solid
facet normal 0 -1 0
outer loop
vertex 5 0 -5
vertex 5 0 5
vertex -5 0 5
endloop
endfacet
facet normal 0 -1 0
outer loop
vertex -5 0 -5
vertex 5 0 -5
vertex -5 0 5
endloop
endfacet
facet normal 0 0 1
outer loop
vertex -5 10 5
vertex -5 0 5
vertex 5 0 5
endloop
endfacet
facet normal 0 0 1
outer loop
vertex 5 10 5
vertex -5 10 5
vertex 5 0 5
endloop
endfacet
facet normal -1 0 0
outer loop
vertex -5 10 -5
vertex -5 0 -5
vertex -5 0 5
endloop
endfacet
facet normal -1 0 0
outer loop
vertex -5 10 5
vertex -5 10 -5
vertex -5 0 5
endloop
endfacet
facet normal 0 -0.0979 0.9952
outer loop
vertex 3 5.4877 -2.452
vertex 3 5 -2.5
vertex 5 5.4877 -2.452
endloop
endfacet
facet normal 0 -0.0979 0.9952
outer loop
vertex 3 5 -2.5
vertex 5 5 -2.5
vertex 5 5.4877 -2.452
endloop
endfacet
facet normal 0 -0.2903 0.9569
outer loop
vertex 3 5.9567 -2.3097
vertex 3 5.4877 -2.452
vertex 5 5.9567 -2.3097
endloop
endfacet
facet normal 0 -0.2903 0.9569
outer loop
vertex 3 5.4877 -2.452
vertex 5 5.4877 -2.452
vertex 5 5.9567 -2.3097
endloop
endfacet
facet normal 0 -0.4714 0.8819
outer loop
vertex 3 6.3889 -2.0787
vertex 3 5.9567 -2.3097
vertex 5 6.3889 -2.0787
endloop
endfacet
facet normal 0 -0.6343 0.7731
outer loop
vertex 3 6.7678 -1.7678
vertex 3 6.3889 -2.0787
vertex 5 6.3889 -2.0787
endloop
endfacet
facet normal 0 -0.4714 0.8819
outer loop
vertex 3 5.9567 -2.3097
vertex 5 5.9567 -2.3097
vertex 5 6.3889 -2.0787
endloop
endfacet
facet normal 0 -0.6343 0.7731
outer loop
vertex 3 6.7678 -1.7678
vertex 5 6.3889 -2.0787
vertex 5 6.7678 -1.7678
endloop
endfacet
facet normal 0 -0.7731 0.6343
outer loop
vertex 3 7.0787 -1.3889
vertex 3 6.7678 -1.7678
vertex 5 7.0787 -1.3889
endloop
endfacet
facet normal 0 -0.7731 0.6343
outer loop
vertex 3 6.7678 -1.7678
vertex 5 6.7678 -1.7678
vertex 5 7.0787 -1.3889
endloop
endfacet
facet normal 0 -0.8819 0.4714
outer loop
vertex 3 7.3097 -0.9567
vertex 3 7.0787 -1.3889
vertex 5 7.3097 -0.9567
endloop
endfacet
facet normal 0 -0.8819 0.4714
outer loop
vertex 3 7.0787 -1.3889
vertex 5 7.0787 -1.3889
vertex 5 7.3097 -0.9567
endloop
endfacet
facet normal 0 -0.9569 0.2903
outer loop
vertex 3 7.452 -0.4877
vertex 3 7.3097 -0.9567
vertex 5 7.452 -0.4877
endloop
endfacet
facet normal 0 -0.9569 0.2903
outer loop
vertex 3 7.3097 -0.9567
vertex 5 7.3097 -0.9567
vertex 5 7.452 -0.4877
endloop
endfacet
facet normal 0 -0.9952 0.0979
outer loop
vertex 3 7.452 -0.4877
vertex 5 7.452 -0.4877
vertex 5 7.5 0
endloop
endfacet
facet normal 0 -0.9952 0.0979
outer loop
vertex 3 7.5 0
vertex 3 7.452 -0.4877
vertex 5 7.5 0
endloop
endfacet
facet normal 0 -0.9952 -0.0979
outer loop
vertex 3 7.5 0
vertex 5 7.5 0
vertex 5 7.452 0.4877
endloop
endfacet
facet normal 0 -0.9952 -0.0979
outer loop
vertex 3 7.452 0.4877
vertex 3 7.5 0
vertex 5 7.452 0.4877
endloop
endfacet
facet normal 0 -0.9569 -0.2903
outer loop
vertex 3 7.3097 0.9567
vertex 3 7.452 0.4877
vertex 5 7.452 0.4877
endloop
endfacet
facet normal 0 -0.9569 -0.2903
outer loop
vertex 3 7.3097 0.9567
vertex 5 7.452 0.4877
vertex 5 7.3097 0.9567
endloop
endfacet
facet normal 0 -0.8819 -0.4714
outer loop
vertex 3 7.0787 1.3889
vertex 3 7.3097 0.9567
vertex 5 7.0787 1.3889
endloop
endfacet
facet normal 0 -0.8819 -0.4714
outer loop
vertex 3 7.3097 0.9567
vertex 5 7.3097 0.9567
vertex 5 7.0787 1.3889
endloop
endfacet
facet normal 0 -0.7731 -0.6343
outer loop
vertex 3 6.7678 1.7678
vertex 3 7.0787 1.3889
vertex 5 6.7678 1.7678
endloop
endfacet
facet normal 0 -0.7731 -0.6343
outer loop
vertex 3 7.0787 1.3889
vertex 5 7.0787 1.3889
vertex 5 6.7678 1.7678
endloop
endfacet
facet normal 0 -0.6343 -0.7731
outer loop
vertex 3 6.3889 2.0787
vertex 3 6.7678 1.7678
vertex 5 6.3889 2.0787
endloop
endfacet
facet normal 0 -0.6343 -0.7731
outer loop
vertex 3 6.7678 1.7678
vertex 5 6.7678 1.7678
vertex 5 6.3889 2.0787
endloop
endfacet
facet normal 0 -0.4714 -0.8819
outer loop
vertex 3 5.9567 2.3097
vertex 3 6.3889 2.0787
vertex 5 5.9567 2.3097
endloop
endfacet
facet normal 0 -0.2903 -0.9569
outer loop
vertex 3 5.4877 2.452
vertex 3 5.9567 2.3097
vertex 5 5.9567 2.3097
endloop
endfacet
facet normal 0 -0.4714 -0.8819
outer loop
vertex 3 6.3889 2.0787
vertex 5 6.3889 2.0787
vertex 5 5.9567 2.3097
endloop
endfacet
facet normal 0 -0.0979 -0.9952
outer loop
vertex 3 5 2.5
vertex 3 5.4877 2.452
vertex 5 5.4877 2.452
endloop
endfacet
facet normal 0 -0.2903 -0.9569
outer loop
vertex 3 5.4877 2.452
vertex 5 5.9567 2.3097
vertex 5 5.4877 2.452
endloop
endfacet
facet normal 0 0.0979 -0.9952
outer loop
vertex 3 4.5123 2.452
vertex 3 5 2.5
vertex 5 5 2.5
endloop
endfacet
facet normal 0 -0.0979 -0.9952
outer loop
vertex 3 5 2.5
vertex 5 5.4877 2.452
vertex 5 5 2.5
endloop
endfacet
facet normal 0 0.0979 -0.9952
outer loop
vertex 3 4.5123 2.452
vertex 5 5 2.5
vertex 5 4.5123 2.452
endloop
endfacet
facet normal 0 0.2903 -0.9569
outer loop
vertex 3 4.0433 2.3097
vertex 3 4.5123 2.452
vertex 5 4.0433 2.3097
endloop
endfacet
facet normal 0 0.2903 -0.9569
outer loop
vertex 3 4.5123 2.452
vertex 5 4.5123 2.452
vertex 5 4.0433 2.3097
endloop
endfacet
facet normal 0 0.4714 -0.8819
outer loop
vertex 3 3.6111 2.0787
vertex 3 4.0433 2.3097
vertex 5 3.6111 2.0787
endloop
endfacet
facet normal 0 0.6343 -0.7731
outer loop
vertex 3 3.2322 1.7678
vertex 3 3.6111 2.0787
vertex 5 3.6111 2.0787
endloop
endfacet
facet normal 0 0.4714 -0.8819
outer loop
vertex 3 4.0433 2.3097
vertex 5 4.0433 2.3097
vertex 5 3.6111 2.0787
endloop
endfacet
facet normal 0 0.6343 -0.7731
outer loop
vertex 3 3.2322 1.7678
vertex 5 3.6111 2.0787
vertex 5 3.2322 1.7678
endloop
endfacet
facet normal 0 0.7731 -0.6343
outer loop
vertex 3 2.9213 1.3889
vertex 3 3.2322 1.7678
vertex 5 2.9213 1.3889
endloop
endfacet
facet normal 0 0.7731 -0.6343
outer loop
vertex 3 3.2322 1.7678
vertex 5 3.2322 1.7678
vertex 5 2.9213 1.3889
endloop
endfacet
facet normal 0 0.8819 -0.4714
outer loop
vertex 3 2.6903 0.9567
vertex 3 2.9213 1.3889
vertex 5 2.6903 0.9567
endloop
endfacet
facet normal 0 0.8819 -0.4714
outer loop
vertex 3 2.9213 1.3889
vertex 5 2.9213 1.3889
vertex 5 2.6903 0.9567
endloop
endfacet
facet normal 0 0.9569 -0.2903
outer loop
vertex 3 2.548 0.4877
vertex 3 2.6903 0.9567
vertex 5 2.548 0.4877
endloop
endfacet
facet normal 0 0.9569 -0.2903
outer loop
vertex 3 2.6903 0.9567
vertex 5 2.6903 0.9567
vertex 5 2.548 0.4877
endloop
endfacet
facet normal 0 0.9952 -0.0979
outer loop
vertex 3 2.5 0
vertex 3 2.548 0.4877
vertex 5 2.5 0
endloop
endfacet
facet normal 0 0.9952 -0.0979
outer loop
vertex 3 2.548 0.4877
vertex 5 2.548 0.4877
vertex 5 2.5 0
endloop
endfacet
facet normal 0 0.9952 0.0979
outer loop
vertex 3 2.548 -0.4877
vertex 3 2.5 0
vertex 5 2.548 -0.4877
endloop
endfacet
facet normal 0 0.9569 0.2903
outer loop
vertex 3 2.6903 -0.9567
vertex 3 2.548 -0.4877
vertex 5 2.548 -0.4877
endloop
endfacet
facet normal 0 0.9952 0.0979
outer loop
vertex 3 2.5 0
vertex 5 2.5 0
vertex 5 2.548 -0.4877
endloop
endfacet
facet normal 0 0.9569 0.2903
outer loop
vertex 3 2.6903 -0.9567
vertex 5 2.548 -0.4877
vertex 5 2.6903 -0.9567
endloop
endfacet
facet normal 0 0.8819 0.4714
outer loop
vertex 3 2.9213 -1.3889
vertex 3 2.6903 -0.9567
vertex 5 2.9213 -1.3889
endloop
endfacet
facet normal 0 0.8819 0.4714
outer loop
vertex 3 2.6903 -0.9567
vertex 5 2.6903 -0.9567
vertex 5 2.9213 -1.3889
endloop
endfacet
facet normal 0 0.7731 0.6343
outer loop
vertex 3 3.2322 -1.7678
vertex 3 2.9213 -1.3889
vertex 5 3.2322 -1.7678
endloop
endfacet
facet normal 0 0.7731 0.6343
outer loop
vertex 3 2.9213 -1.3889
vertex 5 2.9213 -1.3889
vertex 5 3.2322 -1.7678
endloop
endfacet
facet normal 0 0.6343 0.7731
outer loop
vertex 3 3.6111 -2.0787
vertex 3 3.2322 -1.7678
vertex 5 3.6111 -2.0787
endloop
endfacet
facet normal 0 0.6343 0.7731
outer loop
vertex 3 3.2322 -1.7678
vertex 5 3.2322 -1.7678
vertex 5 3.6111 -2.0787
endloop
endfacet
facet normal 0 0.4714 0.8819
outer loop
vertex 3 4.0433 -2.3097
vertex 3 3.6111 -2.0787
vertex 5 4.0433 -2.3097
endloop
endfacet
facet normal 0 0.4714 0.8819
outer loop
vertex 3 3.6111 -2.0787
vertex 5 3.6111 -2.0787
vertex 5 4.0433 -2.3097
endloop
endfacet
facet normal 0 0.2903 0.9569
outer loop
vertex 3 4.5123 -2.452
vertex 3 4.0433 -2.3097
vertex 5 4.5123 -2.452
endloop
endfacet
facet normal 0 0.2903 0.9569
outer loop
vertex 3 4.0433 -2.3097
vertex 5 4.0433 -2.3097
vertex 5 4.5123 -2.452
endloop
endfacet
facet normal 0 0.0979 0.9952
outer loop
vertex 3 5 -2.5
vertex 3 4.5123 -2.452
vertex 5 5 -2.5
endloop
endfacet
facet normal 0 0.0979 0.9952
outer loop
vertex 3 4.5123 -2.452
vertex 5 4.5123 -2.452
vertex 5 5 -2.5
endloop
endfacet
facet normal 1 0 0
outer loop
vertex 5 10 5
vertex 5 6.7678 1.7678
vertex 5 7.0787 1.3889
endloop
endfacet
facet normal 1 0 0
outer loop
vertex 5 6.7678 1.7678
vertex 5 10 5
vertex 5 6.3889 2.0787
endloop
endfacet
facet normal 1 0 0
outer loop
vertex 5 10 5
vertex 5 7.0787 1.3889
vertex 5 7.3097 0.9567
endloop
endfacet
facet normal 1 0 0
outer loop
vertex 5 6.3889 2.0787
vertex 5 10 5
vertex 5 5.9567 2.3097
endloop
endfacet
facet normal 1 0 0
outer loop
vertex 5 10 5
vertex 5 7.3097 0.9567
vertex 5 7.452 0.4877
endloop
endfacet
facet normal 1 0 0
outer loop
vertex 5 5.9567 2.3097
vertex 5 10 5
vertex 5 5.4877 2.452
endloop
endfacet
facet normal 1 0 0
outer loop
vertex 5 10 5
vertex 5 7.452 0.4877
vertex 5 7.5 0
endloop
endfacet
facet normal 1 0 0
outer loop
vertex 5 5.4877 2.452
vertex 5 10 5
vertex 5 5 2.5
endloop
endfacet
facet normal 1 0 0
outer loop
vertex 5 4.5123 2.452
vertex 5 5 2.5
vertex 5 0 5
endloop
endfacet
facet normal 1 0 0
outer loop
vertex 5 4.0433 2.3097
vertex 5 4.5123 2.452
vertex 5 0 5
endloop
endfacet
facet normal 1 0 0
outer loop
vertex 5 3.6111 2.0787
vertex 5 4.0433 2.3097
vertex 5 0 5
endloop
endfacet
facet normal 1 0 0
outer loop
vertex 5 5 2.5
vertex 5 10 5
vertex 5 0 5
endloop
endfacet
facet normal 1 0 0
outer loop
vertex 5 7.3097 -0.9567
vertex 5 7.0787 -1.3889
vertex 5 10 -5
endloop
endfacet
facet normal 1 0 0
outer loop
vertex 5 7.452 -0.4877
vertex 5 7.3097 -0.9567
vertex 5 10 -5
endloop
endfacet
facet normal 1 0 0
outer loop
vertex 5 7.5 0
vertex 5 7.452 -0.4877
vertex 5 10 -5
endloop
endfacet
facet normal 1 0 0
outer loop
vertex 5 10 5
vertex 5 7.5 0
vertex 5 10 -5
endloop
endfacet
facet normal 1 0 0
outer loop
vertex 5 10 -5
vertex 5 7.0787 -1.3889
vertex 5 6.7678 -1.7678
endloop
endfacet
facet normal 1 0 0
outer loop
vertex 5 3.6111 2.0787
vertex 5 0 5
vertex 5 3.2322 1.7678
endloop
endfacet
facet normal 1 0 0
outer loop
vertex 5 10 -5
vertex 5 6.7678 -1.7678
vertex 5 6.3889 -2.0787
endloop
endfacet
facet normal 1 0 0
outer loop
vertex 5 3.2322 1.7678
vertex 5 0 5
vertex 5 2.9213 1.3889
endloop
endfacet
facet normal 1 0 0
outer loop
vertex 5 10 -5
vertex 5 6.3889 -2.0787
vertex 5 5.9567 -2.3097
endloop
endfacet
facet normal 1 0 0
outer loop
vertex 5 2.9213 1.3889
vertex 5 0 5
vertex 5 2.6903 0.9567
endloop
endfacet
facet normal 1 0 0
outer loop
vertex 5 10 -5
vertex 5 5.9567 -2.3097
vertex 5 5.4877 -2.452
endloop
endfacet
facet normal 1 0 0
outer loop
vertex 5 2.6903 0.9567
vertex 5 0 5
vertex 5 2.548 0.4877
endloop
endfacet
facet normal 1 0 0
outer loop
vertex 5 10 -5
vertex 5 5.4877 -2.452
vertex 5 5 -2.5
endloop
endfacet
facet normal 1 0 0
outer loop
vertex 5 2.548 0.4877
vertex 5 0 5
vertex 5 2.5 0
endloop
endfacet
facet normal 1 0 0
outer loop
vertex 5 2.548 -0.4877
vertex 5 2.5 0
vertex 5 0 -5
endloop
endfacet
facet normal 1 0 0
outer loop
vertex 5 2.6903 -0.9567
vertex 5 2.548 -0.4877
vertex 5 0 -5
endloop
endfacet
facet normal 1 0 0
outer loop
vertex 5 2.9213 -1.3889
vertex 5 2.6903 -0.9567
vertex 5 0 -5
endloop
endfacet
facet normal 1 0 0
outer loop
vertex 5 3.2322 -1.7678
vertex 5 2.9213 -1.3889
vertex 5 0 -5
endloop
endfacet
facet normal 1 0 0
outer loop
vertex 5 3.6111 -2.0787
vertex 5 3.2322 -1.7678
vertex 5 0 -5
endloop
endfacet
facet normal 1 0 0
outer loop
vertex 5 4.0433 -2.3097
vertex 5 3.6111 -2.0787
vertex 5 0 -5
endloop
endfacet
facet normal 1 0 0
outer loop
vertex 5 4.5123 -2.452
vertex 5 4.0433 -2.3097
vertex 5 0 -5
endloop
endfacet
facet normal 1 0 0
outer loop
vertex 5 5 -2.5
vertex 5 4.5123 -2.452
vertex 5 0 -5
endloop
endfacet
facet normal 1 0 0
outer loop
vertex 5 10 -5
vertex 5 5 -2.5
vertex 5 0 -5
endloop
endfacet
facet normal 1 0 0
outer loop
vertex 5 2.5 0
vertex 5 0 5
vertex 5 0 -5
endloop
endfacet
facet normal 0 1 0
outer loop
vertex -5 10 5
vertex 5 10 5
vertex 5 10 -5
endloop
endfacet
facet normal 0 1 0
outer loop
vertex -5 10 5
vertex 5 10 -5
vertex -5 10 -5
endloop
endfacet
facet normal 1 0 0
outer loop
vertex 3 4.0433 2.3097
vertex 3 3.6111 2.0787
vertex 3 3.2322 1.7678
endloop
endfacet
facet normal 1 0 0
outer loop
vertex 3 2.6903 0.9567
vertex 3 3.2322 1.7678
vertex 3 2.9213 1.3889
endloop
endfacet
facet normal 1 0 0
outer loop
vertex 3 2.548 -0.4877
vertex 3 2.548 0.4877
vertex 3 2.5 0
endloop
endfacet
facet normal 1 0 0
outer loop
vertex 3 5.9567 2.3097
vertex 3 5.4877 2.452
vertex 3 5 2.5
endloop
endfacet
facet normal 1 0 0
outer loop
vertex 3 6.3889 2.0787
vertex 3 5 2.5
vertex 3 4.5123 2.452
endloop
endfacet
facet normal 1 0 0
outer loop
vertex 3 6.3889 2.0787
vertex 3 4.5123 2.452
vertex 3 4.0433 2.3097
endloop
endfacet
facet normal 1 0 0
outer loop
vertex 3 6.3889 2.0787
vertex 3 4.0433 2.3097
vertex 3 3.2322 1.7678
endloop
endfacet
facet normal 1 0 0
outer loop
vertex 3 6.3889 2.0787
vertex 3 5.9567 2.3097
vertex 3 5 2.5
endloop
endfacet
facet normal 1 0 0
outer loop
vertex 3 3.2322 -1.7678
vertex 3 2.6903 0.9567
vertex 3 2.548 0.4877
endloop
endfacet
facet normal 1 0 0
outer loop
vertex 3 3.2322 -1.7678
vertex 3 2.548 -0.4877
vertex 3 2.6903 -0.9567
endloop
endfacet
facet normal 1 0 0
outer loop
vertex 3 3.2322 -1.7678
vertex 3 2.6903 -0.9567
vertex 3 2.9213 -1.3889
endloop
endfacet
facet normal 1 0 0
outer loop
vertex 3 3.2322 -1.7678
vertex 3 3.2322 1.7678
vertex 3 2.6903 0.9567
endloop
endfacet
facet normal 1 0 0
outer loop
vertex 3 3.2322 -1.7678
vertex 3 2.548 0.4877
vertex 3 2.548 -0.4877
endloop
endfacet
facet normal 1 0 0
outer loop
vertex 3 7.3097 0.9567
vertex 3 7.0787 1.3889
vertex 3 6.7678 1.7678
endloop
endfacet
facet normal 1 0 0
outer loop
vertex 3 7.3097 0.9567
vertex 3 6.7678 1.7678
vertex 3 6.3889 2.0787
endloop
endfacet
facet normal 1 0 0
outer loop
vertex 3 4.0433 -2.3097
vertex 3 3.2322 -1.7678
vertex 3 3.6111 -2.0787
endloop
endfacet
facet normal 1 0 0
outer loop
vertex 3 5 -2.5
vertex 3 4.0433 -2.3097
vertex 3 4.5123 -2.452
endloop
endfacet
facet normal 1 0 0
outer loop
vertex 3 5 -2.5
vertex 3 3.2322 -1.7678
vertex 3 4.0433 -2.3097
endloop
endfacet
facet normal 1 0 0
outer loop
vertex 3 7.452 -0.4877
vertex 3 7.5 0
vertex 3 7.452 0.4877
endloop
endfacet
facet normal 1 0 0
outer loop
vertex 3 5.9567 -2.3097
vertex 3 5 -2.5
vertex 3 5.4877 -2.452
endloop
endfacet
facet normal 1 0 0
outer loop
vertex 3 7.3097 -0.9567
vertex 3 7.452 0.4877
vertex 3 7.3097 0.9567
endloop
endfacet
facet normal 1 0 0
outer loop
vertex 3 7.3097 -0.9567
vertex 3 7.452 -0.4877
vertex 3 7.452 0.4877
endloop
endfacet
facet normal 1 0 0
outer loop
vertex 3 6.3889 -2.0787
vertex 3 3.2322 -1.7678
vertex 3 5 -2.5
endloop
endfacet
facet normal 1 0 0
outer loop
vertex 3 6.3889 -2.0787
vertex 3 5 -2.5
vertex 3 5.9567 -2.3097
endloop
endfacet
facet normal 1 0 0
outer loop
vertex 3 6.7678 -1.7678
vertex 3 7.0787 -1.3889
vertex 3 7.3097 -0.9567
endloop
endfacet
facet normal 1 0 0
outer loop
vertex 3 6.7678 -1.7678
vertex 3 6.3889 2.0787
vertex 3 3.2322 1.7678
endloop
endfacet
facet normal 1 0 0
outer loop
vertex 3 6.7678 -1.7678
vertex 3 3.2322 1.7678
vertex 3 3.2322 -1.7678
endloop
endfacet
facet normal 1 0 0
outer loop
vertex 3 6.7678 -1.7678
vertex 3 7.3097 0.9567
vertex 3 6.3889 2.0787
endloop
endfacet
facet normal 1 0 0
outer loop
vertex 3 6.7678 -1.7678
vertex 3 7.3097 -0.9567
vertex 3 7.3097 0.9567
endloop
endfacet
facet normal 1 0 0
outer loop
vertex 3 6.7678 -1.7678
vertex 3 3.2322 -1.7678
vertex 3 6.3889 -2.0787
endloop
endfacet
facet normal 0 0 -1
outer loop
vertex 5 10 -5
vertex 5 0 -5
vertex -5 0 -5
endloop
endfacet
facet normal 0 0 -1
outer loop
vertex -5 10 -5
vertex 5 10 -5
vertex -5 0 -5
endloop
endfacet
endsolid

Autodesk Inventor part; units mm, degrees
ref_plane "YZ Plane" through (0, 0, 0) normal (1, 0, 0) x (0, 1, 0)
ref_plane "XZ Plane" through (0, 0, 0) normal (0, 1, 0) x (-1, 0, 0)
ref_plane "XY Plane" through (0, 0, 0) normal (0, 0, 1) x (1, 0, 0)
sketch "Sketch1" plane through (0, 0, 0) normal (0, 1, 0) x (-1, 0, 0)
  line L0 (5, 5) -> (-5, 5)
  line L1 (-5, 5) -> (-5, -5)
  line L2 (-5, -5) -> (5, -5)
  line L3 (5, -5) -> (5, 5)
  point P0 (0, 0)
  dimension "d0" = 10
  dimension "d1" = 10
extrude "Extrusion1" add sketch "Sketch1" along normal blind 10
sketch "Sketch2" plane through (5, 0, 5) normal (1, 0, 0) x (0, 0, -1)
  line L0 (0, 0) -> (10, 0) construction
  line L1 (10, 0) -> (10, 10) construction
  line L2 (0, 10) -> (10, 10) construction
  line L3 (0, 0) -> (0, 10) construction
  line L4 (0, 10) -> (10, 10) construction
  line L5 (5, 10) -> (5, 0) construction
  line L6 (0, 0) -> (0, 10) construction
  line L7 (0, 5) -> (10, 5) construction
  line L8 (10, 0) -> (10, 10) construction
  circle A0 centre (5, 5) radius 2.5
  dimension "d4" = 5
extrude "Extrusion2" cut sketch "Sketch2" against normal blind 2
properties part number "cubo_calibracion_1cm"
